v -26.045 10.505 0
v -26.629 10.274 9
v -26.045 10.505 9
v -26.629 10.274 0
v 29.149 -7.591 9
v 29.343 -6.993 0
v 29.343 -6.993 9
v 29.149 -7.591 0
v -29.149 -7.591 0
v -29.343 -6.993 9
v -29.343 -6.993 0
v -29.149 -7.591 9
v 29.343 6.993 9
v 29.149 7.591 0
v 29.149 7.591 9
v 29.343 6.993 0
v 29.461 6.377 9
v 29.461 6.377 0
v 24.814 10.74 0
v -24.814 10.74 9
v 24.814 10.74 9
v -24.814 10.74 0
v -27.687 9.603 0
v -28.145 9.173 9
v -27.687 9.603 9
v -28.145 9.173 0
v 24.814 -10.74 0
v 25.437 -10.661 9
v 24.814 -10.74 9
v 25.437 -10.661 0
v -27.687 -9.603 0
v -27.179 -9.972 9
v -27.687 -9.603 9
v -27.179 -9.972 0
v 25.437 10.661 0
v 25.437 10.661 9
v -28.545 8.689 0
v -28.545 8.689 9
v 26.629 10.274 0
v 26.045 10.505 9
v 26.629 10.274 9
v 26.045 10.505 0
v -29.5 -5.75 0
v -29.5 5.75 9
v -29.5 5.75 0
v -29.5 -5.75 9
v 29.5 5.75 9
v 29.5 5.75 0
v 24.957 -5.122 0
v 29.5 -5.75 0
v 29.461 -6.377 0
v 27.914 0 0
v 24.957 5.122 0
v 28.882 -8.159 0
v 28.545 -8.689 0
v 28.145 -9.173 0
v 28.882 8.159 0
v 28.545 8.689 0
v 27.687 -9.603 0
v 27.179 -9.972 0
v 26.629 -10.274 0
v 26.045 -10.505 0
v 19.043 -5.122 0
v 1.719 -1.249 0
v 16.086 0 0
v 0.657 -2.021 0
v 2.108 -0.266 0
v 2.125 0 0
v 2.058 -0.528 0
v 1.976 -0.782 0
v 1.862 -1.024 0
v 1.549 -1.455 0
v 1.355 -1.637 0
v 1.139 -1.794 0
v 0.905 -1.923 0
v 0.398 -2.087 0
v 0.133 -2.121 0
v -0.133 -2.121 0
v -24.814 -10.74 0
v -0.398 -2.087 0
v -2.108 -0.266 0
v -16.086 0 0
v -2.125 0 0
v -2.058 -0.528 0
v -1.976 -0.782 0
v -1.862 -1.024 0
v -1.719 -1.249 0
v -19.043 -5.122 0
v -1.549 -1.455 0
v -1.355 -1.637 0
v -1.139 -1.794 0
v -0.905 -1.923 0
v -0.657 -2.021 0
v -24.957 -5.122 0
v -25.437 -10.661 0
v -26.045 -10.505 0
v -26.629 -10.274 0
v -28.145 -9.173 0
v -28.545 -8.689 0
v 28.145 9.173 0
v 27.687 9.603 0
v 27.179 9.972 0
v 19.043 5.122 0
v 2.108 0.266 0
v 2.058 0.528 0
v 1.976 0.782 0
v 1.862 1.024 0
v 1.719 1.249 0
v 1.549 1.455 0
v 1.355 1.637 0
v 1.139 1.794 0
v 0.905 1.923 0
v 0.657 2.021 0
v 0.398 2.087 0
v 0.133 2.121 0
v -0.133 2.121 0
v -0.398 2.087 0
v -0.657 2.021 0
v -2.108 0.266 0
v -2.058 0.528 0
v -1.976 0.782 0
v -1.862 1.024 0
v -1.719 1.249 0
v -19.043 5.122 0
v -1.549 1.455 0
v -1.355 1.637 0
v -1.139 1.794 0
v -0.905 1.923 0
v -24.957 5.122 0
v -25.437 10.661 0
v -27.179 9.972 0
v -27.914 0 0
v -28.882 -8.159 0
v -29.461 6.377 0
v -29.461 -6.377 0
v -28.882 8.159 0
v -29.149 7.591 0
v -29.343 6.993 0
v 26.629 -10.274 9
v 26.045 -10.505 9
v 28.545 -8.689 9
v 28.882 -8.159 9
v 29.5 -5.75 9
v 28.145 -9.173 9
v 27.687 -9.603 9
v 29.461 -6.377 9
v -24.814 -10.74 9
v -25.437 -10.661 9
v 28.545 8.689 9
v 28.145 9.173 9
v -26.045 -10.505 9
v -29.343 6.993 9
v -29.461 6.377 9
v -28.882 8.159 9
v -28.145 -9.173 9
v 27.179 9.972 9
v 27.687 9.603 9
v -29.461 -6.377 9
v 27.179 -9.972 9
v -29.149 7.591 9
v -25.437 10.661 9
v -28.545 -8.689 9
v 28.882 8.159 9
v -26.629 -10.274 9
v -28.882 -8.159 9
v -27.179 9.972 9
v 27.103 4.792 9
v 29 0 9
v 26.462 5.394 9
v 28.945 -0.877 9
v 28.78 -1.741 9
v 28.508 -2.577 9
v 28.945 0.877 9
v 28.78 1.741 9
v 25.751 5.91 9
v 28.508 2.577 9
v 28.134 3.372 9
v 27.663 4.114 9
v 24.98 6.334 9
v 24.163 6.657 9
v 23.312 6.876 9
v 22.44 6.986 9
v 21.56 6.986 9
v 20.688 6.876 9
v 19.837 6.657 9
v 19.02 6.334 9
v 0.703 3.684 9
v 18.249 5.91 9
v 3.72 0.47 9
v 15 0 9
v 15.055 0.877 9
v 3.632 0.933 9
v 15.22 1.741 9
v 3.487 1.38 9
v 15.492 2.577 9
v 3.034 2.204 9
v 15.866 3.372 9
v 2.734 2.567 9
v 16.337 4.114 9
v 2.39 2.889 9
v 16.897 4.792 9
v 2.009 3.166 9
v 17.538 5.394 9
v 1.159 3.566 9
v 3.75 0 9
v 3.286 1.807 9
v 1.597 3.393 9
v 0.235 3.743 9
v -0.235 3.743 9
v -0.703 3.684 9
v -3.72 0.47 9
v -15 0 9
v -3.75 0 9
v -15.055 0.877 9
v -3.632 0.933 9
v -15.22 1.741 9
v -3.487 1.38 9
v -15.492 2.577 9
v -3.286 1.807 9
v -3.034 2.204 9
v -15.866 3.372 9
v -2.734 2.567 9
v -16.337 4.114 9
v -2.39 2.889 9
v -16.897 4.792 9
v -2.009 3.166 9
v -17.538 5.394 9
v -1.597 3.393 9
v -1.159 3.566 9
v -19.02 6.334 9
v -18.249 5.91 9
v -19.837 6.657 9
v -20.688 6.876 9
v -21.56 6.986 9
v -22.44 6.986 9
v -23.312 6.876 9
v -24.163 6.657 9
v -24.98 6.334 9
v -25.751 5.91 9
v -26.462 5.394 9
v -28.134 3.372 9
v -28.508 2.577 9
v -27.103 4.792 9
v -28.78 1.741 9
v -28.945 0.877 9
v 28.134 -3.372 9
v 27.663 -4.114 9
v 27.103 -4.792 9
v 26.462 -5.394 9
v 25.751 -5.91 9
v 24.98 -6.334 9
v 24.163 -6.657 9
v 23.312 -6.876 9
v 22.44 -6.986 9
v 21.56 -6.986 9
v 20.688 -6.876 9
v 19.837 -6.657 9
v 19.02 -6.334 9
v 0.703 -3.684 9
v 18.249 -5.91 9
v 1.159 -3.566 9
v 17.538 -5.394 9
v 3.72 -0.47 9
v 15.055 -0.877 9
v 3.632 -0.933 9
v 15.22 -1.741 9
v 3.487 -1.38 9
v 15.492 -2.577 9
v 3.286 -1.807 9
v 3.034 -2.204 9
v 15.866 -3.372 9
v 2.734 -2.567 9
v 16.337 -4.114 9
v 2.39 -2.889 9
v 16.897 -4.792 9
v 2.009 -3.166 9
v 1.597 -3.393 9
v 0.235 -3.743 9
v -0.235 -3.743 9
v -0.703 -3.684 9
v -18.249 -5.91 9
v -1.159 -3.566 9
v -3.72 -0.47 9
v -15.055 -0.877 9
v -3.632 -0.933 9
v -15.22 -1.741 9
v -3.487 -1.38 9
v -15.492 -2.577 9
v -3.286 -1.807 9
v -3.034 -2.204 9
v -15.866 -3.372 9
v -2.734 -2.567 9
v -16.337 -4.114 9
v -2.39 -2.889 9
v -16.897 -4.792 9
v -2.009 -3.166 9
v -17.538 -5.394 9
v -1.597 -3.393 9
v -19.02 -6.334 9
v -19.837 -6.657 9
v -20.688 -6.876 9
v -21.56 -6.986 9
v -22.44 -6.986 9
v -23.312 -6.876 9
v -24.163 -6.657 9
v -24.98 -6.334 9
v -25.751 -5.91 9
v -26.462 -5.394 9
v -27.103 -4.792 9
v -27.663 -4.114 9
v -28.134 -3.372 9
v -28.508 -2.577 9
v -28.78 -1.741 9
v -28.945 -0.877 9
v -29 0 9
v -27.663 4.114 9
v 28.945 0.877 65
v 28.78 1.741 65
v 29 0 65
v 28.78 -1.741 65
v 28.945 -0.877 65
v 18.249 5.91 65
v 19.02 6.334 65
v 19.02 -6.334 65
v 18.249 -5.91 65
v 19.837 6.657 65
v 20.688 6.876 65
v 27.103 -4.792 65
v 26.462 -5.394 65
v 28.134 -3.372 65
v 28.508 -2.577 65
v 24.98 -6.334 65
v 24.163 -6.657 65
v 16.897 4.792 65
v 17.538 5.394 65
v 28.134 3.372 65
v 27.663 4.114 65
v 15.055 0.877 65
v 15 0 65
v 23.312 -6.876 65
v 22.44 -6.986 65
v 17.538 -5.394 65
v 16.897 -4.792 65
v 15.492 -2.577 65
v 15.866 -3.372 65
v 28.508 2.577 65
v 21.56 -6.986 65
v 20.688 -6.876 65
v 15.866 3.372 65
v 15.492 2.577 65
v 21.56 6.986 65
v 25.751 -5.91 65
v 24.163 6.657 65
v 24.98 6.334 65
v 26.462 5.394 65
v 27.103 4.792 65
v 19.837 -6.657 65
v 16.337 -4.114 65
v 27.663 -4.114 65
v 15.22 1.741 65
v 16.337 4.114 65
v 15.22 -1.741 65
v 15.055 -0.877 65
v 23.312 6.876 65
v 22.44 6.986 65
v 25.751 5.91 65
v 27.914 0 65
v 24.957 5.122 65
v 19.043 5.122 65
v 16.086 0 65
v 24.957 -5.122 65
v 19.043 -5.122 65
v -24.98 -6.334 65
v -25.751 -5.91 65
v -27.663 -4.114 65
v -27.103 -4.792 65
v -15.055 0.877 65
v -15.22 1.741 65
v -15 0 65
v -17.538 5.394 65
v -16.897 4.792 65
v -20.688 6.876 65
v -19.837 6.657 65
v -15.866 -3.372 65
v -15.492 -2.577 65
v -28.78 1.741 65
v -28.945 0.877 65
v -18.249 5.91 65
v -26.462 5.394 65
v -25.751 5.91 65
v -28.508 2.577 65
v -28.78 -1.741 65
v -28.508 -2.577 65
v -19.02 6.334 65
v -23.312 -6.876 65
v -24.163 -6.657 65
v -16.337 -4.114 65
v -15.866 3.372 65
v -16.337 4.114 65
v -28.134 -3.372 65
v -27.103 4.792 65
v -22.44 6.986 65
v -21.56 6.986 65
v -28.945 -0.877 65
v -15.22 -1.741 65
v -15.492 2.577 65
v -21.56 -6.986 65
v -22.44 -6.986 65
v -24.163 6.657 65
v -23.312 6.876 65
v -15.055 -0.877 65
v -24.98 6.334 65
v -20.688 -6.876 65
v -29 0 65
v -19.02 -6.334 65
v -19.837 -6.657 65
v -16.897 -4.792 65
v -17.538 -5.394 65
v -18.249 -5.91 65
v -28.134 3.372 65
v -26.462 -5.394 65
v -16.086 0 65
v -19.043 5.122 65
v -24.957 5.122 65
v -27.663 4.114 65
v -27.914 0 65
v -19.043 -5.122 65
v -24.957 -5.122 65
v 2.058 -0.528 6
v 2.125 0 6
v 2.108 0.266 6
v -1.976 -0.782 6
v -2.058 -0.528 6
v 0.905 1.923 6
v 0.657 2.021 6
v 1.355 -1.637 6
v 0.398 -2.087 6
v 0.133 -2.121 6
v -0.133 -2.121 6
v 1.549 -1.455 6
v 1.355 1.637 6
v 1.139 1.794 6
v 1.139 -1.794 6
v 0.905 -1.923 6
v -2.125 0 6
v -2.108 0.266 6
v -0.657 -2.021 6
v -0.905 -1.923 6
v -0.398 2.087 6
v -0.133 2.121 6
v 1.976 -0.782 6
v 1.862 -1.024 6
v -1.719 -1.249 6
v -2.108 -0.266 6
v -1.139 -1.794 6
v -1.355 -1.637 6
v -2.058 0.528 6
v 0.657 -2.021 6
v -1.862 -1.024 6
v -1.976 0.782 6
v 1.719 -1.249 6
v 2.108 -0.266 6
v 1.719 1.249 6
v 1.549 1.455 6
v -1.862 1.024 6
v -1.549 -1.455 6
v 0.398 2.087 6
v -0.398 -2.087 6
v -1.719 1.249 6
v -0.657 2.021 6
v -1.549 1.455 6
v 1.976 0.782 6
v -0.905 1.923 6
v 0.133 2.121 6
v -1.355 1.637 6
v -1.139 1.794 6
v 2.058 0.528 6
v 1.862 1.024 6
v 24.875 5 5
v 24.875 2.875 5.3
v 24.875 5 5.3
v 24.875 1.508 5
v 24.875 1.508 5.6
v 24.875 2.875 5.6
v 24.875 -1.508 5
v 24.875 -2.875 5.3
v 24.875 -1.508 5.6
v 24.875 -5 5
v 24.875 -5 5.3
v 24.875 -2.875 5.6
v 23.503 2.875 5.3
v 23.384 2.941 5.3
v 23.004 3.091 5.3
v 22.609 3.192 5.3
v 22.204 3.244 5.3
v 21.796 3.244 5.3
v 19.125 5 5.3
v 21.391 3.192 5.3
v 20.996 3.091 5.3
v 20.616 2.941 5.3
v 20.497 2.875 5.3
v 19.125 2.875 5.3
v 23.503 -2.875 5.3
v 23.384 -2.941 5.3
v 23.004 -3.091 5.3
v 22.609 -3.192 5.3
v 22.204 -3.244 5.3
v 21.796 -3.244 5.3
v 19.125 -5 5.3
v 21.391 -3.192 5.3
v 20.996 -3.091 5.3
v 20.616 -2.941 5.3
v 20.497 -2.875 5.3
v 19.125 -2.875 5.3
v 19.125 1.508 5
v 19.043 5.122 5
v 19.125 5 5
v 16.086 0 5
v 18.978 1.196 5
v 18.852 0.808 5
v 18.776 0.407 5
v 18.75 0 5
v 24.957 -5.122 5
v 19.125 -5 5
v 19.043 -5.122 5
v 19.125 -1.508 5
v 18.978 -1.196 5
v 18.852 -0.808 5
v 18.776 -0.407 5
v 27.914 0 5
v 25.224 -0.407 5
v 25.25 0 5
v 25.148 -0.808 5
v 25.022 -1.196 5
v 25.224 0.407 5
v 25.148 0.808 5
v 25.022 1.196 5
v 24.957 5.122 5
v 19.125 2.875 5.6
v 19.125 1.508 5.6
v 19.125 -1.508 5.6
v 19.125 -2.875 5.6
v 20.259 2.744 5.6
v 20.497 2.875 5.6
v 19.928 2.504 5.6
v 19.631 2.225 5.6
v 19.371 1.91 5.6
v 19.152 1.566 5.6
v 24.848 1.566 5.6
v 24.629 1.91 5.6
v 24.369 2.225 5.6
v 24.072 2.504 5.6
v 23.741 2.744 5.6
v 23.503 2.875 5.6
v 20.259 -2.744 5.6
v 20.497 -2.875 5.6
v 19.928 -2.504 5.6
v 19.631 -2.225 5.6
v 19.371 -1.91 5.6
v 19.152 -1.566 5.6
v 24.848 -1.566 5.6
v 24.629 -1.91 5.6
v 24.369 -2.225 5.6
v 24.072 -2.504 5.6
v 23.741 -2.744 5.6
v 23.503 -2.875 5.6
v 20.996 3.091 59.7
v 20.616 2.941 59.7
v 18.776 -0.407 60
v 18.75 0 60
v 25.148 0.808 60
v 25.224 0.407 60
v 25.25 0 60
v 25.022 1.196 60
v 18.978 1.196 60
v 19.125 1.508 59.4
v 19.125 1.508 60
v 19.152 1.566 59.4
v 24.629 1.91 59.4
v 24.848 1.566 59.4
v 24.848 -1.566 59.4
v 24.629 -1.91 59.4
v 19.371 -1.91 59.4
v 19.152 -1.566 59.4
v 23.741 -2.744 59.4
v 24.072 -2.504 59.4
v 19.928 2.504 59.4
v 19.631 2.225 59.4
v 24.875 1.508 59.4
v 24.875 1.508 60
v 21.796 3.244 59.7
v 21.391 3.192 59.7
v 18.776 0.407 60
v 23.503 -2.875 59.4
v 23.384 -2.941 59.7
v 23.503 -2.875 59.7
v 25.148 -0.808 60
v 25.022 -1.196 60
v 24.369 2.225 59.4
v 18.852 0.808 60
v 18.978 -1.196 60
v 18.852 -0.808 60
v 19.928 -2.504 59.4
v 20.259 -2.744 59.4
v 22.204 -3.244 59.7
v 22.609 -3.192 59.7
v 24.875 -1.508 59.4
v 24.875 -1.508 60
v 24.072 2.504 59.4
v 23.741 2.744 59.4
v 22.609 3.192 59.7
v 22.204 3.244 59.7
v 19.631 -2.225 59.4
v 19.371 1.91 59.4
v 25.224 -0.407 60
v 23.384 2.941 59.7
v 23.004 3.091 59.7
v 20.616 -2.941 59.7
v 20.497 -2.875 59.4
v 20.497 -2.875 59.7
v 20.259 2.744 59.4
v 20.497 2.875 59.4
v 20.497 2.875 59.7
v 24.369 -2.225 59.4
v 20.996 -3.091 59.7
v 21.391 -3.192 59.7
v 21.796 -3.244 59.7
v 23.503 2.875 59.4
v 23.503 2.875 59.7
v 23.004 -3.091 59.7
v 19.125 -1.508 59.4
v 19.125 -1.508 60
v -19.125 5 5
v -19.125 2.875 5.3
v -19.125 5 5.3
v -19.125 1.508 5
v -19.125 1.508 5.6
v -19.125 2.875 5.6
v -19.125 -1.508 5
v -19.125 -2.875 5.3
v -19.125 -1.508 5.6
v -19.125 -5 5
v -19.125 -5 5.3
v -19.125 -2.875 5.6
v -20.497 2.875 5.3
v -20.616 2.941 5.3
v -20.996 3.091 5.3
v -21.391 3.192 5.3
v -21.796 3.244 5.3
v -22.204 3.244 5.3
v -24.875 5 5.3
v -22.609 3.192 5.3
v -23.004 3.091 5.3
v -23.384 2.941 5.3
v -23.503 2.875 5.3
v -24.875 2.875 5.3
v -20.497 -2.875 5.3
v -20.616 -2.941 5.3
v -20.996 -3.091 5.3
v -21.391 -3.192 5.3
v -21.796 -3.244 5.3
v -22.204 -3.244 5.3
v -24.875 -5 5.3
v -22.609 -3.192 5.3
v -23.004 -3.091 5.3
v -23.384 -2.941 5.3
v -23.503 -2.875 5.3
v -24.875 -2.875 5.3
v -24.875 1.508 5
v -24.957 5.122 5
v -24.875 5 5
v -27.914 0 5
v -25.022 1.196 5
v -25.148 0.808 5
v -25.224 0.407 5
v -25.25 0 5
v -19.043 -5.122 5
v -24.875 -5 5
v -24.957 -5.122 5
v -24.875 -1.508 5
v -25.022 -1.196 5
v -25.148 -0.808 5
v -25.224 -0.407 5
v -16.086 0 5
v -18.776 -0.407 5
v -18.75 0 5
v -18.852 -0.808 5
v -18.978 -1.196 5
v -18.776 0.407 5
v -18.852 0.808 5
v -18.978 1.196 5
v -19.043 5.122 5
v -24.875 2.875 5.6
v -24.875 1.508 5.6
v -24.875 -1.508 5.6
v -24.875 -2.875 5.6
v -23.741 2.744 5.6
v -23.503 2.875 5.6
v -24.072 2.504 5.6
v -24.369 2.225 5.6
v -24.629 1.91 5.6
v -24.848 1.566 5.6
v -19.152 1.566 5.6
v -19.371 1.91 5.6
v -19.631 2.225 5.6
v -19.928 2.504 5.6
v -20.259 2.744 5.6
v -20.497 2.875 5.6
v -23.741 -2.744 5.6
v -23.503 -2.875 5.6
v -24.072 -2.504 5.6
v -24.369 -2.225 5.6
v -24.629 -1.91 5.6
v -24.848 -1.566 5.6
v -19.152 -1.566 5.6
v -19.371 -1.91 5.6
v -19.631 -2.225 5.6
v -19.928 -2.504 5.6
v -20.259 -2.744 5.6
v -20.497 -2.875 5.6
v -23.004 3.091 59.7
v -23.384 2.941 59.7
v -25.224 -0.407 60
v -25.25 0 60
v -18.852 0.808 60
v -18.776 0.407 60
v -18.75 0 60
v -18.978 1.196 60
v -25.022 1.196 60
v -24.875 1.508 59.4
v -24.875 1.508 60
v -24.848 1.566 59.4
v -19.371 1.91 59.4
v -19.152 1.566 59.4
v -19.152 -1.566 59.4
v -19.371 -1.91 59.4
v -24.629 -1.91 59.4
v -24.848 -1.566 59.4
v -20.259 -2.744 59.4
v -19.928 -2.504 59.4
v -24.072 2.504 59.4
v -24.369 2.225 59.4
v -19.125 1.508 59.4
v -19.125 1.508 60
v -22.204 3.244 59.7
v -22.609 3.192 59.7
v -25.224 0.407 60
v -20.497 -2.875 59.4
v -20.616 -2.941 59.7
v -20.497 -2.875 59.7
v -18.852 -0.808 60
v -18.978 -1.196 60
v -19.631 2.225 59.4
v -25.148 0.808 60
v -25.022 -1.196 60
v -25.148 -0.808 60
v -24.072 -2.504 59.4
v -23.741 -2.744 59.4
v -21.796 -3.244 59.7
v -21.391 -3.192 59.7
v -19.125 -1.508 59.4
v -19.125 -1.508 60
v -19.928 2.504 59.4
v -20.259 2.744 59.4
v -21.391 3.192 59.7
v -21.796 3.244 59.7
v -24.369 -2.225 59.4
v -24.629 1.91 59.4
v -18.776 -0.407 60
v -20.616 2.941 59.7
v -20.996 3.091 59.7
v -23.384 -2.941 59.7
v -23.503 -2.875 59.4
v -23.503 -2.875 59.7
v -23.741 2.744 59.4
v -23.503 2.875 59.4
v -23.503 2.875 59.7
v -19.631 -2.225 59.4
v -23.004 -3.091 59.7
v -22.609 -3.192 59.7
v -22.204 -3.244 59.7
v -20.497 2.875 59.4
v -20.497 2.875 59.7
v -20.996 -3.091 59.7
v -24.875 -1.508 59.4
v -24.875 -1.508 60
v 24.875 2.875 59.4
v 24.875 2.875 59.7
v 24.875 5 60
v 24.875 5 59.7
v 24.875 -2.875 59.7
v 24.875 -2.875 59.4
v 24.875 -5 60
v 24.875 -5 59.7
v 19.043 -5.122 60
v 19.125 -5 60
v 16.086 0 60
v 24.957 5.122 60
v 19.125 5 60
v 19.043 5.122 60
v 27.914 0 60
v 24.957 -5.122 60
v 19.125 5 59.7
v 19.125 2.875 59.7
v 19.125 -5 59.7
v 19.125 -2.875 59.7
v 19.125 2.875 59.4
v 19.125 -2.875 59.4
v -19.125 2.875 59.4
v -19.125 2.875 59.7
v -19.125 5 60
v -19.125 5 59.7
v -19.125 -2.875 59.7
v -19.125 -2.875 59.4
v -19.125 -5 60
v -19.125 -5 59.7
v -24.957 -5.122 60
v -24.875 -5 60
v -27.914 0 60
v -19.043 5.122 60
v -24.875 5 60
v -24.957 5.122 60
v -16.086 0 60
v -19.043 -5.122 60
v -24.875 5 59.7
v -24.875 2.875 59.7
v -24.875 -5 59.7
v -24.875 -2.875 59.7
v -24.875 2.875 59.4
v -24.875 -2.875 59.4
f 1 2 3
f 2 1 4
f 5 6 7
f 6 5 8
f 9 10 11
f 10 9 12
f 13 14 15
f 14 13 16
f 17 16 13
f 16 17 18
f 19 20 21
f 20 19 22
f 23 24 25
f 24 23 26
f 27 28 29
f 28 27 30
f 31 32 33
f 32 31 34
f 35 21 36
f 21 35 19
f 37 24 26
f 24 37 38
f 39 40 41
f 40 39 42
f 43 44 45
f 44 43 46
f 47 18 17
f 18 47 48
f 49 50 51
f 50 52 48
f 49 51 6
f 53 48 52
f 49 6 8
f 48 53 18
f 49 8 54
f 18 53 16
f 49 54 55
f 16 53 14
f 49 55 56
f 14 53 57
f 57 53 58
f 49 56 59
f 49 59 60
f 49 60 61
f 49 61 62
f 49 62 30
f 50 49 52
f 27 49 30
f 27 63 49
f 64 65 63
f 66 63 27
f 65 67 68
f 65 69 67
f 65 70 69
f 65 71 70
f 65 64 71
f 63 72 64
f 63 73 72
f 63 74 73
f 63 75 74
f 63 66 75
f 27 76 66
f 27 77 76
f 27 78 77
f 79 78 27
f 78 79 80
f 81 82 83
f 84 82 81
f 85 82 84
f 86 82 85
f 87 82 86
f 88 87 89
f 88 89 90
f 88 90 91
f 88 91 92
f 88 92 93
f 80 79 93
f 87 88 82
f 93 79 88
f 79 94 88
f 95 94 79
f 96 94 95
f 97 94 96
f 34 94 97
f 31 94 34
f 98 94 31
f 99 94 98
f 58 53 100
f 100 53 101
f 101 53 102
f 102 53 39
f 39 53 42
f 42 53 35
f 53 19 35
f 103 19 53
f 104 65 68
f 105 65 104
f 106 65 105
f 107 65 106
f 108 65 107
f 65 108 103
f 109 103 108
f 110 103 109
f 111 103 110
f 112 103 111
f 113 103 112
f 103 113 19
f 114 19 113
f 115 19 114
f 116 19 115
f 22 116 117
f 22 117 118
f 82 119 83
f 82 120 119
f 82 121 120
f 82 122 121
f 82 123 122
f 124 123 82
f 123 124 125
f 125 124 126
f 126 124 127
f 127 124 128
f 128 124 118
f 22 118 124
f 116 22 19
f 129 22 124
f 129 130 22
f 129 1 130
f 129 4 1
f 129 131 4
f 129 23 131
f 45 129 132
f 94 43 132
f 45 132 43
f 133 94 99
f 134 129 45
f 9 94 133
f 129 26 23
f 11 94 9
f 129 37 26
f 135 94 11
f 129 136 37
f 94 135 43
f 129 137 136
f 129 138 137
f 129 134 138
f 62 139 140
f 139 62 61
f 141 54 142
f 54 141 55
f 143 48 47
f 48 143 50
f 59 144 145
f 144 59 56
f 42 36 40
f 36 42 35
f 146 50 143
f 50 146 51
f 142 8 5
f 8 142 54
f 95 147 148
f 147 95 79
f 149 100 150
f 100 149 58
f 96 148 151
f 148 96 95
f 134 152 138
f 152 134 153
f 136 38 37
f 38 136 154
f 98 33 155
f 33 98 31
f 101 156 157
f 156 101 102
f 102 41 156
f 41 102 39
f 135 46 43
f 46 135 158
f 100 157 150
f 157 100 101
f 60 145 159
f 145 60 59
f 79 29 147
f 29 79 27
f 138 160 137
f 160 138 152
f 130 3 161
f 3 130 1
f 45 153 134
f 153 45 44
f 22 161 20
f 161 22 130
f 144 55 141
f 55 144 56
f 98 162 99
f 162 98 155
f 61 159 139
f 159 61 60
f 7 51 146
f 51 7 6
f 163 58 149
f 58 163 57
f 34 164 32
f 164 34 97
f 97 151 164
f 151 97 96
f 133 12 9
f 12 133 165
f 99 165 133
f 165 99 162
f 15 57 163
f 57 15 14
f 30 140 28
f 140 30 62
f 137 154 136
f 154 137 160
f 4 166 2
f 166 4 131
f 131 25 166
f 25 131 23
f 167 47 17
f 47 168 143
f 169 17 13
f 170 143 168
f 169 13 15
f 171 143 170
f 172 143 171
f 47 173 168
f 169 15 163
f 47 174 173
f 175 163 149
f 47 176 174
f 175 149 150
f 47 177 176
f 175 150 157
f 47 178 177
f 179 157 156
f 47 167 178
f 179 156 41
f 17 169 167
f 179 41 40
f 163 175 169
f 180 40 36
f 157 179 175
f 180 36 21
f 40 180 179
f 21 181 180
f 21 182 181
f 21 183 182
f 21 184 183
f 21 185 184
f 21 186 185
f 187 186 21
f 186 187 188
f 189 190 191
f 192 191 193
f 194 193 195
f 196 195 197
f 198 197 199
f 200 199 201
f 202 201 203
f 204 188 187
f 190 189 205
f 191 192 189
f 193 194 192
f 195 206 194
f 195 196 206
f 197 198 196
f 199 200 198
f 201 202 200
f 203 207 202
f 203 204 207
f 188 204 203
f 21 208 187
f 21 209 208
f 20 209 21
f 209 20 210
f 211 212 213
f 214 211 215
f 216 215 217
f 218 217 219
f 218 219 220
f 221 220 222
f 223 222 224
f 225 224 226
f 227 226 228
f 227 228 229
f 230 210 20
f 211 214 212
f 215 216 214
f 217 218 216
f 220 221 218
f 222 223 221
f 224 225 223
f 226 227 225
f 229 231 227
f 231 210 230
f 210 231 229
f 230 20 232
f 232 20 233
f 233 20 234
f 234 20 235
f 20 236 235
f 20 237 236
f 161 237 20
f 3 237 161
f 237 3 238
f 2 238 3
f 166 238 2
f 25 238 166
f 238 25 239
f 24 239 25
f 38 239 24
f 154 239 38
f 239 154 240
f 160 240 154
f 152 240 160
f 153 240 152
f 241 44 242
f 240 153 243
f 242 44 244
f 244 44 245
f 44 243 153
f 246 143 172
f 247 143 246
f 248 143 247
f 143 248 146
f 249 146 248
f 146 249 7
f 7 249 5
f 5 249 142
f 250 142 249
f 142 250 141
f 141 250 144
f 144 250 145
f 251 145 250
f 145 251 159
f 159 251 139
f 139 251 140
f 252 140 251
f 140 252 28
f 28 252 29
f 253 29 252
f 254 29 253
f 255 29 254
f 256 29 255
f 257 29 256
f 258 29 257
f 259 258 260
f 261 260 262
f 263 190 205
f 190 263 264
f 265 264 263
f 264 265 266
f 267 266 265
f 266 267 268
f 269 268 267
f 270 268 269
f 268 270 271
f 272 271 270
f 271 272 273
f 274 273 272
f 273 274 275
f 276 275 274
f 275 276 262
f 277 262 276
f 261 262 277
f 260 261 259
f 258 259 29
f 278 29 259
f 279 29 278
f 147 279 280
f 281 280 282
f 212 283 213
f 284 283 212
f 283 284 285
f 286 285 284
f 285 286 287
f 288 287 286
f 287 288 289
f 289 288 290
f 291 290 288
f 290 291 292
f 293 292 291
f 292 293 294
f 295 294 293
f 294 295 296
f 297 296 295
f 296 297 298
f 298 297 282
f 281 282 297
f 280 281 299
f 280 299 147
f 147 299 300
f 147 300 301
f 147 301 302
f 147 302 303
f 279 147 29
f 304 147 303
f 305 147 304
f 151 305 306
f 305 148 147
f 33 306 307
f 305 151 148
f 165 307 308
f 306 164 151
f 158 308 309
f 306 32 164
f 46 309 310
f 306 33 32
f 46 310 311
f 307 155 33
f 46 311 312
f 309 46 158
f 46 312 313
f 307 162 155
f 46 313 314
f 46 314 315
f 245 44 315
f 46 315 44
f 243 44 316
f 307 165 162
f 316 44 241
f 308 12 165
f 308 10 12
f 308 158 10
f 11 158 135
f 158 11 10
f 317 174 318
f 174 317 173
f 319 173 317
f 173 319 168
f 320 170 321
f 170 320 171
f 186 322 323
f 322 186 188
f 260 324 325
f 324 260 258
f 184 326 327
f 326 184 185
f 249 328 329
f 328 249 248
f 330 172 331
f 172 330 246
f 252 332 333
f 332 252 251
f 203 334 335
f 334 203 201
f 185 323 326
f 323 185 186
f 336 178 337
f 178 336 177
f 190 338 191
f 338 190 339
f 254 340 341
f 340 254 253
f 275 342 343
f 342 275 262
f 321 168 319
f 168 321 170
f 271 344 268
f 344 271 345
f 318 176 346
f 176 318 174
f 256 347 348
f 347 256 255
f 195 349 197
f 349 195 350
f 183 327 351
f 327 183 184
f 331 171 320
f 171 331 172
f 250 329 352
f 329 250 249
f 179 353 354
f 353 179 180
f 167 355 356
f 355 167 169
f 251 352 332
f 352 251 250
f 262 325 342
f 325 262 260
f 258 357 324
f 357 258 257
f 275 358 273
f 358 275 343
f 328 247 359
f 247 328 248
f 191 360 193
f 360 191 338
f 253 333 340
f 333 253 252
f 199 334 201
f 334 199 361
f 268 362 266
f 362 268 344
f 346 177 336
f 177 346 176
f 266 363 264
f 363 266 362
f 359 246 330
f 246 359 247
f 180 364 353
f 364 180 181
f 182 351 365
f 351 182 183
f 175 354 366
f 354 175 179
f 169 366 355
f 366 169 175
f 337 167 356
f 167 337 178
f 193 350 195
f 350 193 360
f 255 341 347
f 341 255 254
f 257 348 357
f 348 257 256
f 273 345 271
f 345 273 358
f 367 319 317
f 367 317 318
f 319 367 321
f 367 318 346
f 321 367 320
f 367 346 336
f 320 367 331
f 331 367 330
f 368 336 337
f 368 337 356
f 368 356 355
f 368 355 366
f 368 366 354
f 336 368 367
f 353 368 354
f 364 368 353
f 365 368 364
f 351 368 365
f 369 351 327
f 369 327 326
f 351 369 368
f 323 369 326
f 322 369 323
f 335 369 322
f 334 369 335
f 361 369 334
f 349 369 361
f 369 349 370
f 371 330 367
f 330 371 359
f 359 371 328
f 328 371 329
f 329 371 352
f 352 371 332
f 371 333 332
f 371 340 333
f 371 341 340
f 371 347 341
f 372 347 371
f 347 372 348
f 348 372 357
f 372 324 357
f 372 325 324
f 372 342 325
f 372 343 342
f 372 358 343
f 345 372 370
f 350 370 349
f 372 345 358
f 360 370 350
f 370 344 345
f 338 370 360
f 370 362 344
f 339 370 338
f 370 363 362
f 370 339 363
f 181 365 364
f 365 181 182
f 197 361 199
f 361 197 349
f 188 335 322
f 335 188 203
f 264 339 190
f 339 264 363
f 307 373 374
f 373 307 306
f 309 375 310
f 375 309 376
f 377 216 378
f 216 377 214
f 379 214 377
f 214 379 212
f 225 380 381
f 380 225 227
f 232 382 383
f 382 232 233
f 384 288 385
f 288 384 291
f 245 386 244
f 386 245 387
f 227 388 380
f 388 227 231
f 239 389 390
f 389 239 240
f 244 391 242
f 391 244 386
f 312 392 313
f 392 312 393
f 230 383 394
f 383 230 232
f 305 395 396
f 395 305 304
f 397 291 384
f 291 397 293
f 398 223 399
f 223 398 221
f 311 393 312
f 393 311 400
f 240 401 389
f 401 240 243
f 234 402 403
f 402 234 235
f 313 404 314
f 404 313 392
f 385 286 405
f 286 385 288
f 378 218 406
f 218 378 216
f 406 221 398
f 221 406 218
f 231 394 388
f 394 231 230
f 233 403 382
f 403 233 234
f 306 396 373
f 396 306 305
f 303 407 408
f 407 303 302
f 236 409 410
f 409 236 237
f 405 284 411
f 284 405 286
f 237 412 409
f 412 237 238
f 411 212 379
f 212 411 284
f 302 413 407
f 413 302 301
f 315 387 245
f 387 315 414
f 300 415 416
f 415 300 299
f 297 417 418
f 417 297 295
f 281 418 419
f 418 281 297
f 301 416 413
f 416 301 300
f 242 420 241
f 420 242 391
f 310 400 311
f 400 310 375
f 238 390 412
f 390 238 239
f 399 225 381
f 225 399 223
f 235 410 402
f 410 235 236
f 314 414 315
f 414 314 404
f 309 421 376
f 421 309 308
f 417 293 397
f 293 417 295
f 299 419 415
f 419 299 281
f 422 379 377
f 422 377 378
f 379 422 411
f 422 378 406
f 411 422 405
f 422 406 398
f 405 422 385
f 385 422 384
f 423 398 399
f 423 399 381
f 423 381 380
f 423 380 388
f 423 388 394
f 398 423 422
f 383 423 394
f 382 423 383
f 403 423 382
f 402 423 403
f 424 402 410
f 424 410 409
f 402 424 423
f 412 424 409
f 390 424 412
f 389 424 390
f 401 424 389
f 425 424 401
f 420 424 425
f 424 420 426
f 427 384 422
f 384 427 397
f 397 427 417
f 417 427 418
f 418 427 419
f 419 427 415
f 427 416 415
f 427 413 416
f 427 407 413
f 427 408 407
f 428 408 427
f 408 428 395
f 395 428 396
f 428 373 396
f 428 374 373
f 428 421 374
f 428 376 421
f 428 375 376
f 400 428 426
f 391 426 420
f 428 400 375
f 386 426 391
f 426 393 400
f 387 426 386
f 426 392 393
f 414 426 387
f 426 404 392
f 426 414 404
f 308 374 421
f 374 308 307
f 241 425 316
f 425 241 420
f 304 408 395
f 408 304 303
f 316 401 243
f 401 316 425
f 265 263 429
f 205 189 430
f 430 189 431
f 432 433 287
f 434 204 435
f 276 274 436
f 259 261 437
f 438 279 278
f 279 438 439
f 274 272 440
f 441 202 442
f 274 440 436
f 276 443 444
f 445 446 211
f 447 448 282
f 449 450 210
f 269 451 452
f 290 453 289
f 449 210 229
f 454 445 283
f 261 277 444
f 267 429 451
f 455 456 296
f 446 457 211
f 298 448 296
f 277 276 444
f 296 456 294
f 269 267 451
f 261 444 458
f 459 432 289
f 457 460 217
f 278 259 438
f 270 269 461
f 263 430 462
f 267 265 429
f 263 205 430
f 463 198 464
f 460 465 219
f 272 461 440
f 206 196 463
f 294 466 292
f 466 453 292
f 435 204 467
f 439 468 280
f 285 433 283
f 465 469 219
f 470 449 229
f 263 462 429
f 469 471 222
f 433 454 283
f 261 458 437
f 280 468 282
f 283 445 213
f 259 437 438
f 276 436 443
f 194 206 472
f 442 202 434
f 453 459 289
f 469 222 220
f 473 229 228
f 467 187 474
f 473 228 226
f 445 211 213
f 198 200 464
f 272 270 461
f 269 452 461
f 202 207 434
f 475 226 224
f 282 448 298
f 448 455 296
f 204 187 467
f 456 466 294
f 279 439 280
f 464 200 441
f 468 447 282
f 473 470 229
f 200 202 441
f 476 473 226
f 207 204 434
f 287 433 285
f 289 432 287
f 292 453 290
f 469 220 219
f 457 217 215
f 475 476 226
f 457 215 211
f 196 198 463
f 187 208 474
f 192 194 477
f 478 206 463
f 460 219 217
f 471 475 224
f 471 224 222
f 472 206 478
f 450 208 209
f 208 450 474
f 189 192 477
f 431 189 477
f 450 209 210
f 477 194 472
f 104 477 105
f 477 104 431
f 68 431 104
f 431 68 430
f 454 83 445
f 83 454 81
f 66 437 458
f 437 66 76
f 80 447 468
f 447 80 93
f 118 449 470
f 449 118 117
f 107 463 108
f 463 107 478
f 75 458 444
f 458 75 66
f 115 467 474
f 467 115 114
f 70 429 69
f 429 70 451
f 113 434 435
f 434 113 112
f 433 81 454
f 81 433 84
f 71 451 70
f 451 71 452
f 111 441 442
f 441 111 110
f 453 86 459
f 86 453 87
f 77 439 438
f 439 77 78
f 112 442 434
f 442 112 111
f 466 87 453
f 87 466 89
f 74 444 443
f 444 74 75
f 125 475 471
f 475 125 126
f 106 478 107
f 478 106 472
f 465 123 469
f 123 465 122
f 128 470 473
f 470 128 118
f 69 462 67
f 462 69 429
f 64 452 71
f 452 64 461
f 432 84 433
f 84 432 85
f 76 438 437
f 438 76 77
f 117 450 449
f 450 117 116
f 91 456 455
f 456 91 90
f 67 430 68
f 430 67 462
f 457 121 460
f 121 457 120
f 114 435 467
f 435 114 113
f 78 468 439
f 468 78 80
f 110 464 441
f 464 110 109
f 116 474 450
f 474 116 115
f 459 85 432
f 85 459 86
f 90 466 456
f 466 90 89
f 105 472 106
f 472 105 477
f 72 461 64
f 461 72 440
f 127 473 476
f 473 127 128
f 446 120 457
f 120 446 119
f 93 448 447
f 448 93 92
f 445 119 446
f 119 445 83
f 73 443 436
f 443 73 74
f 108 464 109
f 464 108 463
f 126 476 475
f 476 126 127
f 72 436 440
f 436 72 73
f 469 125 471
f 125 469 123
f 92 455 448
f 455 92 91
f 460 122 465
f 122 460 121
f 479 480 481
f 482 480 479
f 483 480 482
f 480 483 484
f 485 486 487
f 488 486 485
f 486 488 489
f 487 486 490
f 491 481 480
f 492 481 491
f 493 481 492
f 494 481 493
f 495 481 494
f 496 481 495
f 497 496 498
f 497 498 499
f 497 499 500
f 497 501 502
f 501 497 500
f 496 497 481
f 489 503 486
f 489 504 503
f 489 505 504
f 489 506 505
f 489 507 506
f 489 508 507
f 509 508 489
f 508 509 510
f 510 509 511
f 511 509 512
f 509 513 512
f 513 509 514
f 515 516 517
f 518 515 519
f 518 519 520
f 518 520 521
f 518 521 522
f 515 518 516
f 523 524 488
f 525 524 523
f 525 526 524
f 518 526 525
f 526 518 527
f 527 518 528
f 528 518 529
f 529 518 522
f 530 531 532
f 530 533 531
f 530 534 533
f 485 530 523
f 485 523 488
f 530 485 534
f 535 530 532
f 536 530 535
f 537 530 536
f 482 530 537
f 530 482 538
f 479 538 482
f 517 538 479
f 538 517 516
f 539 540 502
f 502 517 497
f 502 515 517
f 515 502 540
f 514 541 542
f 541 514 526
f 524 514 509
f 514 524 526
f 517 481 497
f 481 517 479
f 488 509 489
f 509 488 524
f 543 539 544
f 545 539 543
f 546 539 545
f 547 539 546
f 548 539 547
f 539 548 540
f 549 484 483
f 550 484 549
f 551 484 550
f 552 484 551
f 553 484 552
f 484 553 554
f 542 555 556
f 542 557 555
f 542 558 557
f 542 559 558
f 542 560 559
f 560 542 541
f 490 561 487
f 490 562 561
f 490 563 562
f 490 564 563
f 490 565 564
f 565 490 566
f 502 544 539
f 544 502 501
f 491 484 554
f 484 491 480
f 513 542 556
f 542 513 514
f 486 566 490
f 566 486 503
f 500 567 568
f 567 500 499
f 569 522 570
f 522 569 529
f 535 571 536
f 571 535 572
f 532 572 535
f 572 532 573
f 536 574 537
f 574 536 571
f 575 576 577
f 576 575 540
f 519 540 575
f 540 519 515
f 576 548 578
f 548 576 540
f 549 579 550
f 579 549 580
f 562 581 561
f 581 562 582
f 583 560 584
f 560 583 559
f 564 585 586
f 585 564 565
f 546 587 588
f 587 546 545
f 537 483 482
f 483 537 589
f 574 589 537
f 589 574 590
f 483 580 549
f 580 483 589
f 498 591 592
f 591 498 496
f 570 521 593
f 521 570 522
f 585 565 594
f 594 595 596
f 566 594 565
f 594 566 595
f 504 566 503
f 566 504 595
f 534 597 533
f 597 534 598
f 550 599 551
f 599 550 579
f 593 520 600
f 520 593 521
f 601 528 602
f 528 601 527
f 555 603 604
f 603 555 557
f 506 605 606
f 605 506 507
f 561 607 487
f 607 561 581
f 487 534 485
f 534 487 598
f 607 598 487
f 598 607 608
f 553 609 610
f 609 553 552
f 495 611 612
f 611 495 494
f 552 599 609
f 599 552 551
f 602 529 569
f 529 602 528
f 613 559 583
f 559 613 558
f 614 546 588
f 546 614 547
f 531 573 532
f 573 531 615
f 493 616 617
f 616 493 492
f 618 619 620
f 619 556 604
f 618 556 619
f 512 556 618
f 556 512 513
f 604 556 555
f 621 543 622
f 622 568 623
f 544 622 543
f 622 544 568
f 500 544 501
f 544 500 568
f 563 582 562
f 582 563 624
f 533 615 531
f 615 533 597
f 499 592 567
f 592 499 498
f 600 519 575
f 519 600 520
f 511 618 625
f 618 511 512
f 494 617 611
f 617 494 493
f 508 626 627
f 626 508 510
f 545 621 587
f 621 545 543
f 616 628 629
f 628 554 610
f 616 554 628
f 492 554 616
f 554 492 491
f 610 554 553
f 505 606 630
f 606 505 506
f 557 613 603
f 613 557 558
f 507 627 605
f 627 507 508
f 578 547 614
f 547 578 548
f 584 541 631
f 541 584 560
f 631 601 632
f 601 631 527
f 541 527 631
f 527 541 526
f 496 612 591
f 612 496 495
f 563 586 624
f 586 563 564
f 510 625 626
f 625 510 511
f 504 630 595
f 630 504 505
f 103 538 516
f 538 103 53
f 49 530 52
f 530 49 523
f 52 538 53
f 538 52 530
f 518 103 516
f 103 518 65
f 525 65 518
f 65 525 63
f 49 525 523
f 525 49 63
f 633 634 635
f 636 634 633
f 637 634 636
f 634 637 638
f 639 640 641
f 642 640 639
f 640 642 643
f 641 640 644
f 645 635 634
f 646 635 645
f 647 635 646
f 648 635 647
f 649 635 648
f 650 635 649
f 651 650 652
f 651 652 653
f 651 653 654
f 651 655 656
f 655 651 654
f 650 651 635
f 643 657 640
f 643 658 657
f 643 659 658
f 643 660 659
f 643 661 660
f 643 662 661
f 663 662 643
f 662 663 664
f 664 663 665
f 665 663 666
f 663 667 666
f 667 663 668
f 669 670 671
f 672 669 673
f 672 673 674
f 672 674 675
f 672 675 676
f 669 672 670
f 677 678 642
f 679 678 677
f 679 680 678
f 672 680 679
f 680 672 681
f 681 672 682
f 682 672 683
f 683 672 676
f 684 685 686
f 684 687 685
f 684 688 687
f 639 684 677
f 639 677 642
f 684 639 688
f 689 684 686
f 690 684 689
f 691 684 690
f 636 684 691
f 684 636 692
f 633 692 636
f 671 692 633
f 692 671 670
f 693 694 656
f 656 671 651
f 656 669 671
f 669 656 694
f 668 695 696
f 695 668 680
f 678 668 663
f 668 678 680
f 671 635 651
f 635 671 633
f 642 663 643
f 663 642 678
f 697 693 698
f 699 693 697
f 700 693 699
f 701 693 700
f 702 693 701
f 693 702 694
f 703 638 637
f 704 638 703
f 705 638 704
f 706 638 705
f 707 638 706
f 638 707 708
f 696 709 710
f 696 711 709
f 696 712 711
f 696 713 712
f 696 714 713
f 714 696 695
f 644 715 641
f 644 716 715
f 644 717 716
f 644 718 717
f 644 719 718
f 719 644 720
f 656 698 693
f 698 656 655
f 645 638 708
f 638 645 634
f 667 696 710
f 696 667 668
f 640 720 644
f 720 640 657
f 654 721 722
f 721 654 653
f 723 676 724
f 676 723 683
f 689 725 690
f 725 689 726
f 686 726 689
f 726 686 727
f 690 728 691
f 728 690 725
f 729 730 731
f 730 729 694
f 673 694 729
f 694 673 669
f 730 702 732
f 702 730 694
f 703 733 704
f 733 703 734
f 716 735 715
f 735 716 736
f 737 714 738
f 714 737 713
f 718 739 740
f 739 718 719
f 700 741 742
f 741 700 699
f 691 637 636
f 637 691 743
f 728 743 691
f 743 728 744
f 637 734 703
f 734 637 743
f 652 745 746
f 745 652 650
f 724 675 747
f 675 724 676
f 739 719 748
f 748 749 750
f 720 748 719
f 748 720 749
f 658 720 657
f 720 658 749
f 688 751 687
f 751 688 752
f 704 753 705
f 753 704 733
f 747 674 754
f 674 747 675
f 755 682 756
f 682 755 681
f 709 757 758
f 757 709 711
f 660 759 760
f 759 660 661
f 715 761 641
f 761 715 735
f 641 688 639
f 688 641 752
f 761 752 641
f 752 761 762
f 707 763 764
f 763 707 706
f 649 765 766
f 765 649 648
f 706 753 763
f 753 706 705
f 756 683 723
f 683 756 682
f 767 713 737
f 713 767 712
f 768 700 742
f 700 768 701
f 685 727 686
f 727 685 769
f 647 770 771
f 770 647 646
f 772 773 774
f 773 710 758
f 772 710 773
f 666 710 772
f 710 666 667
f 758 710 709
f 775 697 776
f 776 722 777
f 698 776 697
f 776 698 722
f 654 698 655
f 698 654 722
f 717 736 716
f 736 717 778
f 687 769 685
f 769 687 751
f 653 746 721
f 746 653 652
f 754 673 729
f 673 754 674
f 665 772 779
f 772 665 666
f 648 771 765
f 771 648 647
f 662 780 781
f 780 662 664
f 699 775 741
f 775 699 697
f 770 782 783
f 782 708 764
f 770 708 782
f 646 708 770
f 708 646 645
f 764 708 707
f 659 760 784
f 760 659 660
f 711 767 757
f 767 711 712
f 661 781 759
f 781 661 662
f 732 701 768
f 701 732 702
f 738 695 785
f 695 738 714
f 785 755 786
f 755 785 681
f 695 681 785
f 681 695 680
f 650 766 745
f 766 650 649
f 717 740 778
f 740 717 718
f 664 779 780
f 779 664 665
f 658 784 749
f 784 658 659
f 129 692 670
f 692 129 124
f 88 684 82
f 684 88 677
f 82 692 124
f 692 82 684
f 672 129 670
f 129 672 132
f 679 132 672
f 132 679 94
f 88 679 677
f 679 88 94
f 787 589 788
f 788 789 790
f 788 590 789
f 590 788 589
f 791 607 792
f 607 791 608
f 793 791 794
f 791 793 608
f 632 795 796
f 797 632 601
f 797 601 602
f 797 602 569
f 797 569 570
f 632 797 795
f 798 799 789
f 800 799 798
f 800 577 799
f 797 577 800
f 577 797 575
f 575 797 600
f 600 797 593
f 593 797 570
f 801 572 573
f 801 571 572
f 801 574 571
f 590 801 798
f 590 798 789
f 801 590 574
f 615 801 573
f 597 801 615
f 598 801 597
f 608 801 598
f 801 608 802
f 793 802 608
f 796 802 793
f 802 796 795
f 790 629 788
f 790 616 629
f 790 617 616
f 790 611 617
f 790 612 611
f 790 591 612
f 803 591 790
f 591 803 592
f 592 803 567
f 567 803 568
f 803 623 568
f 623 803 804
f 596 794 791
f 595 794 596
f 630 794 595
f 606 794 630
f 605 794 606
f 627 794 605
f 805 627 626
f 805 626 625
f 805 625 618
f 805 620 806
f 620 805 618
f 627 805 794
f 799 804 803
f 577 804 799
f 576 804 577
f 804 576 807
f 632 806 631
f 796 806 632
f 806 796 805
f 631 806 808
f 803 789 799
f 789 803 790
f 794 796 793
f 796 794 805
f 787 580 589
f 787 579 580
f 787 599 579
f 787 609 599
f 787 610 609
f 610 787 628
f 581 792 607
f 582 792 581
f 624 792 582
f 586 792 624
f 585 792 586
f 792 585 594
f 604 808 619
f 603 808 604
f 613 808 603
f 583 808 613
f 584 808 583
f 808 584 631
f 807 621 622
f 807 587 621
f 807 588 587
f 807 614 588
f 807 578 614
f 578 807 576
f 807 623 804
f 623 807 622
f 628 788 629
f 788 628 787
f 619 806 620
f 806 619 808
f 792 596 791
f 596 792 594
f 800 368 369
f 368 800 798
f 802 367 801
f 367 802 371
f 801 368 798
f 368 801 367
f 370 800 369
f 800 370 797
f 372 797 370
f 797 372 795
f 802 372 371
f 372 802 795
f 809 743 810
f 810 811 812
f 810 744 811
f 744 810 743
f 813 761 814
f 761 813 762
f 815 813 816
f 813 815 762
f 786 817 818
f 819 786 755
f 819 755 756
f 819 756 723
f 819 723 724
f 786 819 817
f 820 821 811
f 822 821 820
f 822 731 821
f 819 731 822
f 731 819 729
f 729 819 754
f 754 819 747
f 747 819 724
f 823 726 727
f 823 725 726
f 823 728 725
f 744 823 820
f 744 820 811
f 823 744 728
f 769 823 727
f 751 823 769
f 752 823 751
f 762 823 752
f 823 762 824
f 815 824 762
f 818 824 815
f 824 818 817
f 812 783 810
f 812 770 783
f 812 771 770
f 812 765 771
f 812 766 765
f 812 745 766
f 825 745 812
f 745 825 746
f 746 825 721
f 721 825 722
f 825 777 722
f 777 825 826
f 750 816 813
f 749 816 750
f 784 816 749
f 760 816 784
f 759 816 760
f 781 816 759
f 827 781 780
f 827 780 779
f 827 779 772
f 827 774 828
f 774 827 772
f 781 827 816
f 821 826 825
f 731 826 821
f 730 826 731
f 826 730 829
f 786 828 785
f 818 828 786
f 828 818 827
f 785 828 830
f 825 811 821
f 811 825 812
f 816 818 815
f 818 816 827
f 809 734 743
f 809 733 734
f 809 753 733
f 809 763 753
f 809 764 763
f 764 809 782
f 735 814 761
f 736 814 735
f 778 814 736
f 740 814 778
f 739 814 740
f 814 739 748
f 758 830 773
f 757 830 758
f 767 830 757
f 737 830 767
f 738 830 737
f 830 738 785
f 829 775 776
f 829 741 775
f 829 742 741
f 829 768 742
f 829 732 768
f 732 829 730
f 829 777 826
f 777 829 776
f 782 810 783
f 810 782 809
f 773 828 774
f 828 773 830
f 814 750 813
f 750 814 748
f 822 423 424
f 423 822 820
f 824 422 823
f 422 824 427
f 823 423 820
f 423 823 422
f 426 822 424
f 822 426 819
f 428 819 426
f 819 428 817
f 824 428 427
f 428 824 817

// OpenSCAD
$fn = 50;


difference() {
	union() {
		hull() {
			translate(v = [-24.5000000000, 5.7500000000, 0]) {
				cylinder(h = 9, r = 5);
			}
			translate(v = [24.5000000000, 5.7500000000, 0]) {
				cylinder(h = 9, r = 5);
			}
			translate(v = [-24.5000000000, -5.7500000000, 0]) {
				cylinder(h = 9, r = 5);
			}
			translate(v = [24.5000000000, -5.7500000000, 0]) {
				cylinder(h = 9, r = 5);
			}
		}
		translate(v = [22.0000000000, 0, 0.0000000000]) {
			cylinder(h = 65, r = 7.0000000000);
		}
		translate(v = [-22.0000000000, 0, 0.0000000000]) {
			cylinder(h = 65, r = 7.0000000000);
		}
		translate(v = [22.0000000000, 0, 59.0000000000]) {
			cylinder(h = 6, r = 7.0000000000);
		}
		translate(v = [-22.0000000000, 0, 59.0000000000]) {
			cylinder(h = 6, r = 7.0000000000);
		}
	}
	union() {
		translate(v = [0, 0, 9]) {
			rotate(a = [0, 0, 0]) {
				difference() {
					union() {
						#translate(v = [0, 0, -60.0000000000]) {
							cylinder(h = 60, r = 2.0000000000);
						}
						#translate(v = [0, 0, -3]) {
							cylinder(h = 3, r1 = 2.1250000000, r2 = 3.7500000000);
						}
						#translate(v = [0, 0, -60.0000000000]) {
							cylinder(h = 60, r = 2.1250000000);
						}
						#translate(v = [0, 0, -60.0000000000]) {
							cylinder(h = 60, r = 2.0000000000);
						}
					}
					union();
				}
			}
		}
		translate(v = [22.0000000000, 0, 0]) {
			rotate(a = [0, 0, 0]) {
				difference() {
					union() {
						#translate(v = [-2.8750000000, -5.0000000000, -0.3000000000]) {
							cube(size = [5.7500000000, 10, 0.3000000000]);
						}
						#translate(v = [-2.8750000000, -2.8750000000, -0.6000000000]) {
							cube(size = [5.7500000000, 5.7500000000, 0.3000000000]);
						}
						#translate(v = [-2.8750000000, -5.0000000000, 5]) {
							cube(size = [5.7500000000, 10, 0.3000000000]);
						}
						#translate(v = [-2.8750000000, -2.8750000000, 5.3000000000]) {
							cube(size = [5.7500000000, 5.7500000000, 0.3000000000]);
						}
						#translate(v = [0, 0, -100.0000000000]) {
							cylinder(h = 200, r = 3.2500000000);
						}
						#linear_extrude(height = 5) {
							polygon(points = [[5.9142500000, 0.0000000000], [2.9571250000, 5.1218907443], [-2.9571250000, 5.1218907443], [-5.9142500000, 0.0000000000], [-2.9571250000, -5.1218907443], [2.9571250000, -5.1218907443]]);
						}
						#translate(v = [-2.8750000000, -5.0000000000, -0.3000000000]) {
							cube(size = [5.7500000000, 10, 0.3000000000]);
						}
						#translate(v = [-2.8750000000, -2.8750000000, -0.6000000000]) {
							cube(size = [5.7500000000, 5.7500000000, 0.3000000000]);
						}
						#translate(v = [-2.8750000000, -5.0000000000, 5]) {
							cube(size = [5.7500000000, 10, 0.3000000000]);
						}
						#translate(v = [-2.8750000000, -2.8750000000, 5.3000000000]) {
							cube(size = [5.7500000000, 5.7500000000, 0.3000000000]);
						}
						#translate(v = [0, 0, -100.0000000000]) {
							cylinder(h = 200, r = 3.2500000000);
						}
						#translate(v = [-2.8750000000, -5.0000000000, -0.3000000000]) {
							cube(size = [5.7500000000, 10, 0.3000000000]);
						}
						#translate(v = [-2.8750000000, -2.8750000000, -0.6000000000]) {
							cube(size = [5.7500000000, 5.7500000000, 0.3000000000]);
						}
						#translate(v = [-2.8750000000, -5.0000000000, 5]) {
							cube(size = [5.7500000000, 10, 0.3000000000]);
						}
						#translate(v = [-2.8750000000, -2.8750000000, 5.3000000000]) {
							cube(size = [5.7500000000, 5.7500000000, 0.3000000000]);
						}
						#translate(v = [0, 0, -100.0000000000]) {
							cylinder(h = 200, r = 3.2500000000);
						}
					}
					union();
				}
			}
		}
		translate(v = [-22.0000000000, 0, 0]) {
			rotate(a = [0, 0, 0]) {
				difference() {
					union() {
						#translate(v = [-2.8750000000, -5.0000000000, -0.3000000000]) {
							cube(size = [5.7500000000, 10, 0.3000000000]);
						}
						#translate(v = [-2.8750000000, -2.8750000000, -0.6000000000]) {
							cube(size = [5.7500000000, 5.7500000000, 0.3000000000]);
						}
						#translate(v = [-2.8750000000, -5.0000000000, 5]) {
							cube(size = [5.7500000000, 10, 0.3000000000]);
						}
						#translate(v = [-2.8750000000, -2.8750000000, 5.3000000000]) {
							cube(size = [5.7500000000, 5.7500000000, 0.3000000000]);
						}
						#translate(v = [0, 0, -100.0000000000]) {
							cylinder(h = 200, r = 3.2500000000);
						}
						#linear_extrude(height = 5) {
							polygon(points = [[5.9142500000, 0.0000000000], [2.9571250000, 5.1218907443], [-2.9571250000, 5.1218907443], [-5.9142500000, 0.0000000000], [-2.9571250000, -5.1218907443], [2.9571250000, -5.1218907443]]);
						}
						#translate(v = [-2.8750000000, -5.0000000000, -0.3000000000]) {
							cube(size = [5.7500000000, 10, 0.3000000000]);
						}
						#translate(v = [-2.8750000000, -2.8750000000, -0.6000000000]) {
							cube(size = [5.7500000000, 5.7500000000, 0.3000000000]);
						}
						#translate(v = [-2.8750000000, -5.0000000000, 5]) {
							cube(size = [5.7500000000, 10, 0.3000000000]);
						}
						#translate(v = [-2.8750000000, -2.8750000000, 5.3000000000]) {
							cube(size = [5.7500000000, 5.7500000000, 0.3000000000]);
						}
						#translate(v = [0, 0, -100.0000000000]) {
							cylinder(h = 200, r = 3.2500000000);
						}
						#translate(v = [-2.8750000000, -5.0000000000, -0.3000000000]) {
							cube(size = [5.7500000000, 10, 0.3000000000]);
						}
						#translate(v = [-2.8750000000, -2.8750000000, -0.6000000000]) {
							cube(size = [5.7500000000, 5.7500000000, 0.3000000000]);
						}
						#translate(v = [-2.8750000000, -5.0000000000, 5]) {
							cube(size = [5.7500000000, 10, 0.3000000000]);
						}
						#translate(v = [-2.8750000000, -2.8750000000, 5.3000000000]) {
							cube(size = [5.7500000000, 5.7500000000, 0.3000000000]);
						}
						#translate(v = [0, 0, -100.0000000000]) {
							cylinder(h = 200, r = 3.2500000000);
						}
					}
					union();
				}
			}
		}
		translate(v = [22.0000000000, 0, 65]) {
			rotate(a = [0, 0, 0]) {
				difference() {
					union() {
						#translate(v = [-2.8750000000, -5.0000000000, -5.3000000000]) {
							cube(size = [5.7500000000, 10, 0.3000000000]);
						}
						#translate(v = [-2.8750000000, -2.8750000000, -5.6000000000]) {
							cube(size = [5.7500000000, 5.7500000000, 0.3000000000]);
						}
						#translate(v = [-2.8750000000, -5.0000000000, 0]) {
							cube(size = [5.7500000000, 10, 0.3000000000]);
						}
						#translate(v = [-2.8750000000, -2.8750000000, 0.3000000000]) {
							cube(size = [5.7500000000, 5.7500000000, 0.3000000000]);
						}
						#translate(v = [0, 0, -100.0000000000]) {
							cylinder(h = 200, r = 3.2500000000);
						}
						translate(v = [0, 0, -5]) {
							#linear_extrude(height = 5) {
								polygon(points = [[5.9142500000, 0.0000000000], [2.9571250000, 5.1218907443], [-2.9571250000, 5.1218907443], [-5.9142500000, 0.0000000000], [-2.9571250000, -5.1218907443], [2.9571250000, -5.1218907443]]);
							}
						}
						#translate(v = [-2.8750000000, -5.0000000000, -5.3000000000]) {
							cube(size = [5.7500000000, 10, 0.3000000000]);
						}
						#translate(v = [-2.8750000000, -2.8750000000, -5.6000000000]) {
							cube(size = [5.7500000000, 5.7500000000, 0.3000000000]);
						}
						#translate(v = [-2.8750000000, -5.0000000000, 0]) {
							cube(size = [5.7500000000, 10, 0.3000000000]);
						}
						#translate(v = [-2.8750000000, -2.8750000000, 0.3000000000]) {
							cube(size = [5.7500000000, 5.7500000000, 0.3000000000]);
						}
						#translate(v = [0, 0, -100.0000000000]) {
							cylinder(h = 200, r = 3.2500000000);
						}
						#translate(v = [-2.8750000000, -5.0000000000, -5.3000000000]) {
							cube(size = [5.7500000000, 10, 0.3000000000]);
						}
						#translate(v = [-2.8750000000, -2.8750000000, -5.6000000000]) {
							cube(size = [5.7500000000, 5.7500000000, 0.3000000000]);
						}
						#translate(v = [-2.8750000000, -5.0000000000, 0]) {
							cube(size = [5.7500000000, 10, 0.3000000000]);
						}
						#translate(v = [-2.8750000000, -2.8750000000, 0.3000000000]) {
							cube(size = [5.7500000000, 5.7500000000, 0.3000000000]);
						}
						#translate(v = [0, 0, -100.0000000000]) {
							cylinder(h = 200, r = 3.2500000000);
						}
					}
					union();
				}
			}
		}
		translate(v = [-22.0000000000, 0, 65]) {
			rotate(a = [0, 0, 0]) {
				difference() {
					union() {
						#translate(v = [-2.8750000000, -5.0000000000, -5.3000000000]) {
							cube(size = [5.7500000000, 10, 0.3000000000]);
						}
						#translate(v = [-2.8750000000, -2.8750000000, -5.6000000000]) {
							cube(size = [5.7500000000, 5.7500000000, 0.3000000000]);
						}
						#translate(v = [-2.8750000000, -5.0000000000, 0]) {
							cube(size = [5.7500000000, 10, 0.3000000000]);
						}
						#translate(v = [-2.8750000000, -2.8750000000, 0.3000000000]) {
							cube(size = [5.7500000000, 5.7500000000, 0.3000000000]);
						}
						#translate(v = [0, 0, -100.0000000000]) {
							cylinder(h = 200, r = 3.2500000000);
						}
						translate(v = [0, 0, -5]) {
							#linear_extrude(height = 5) {
								polygon(points = [[5.9142500000, 0.0000000000], [2.9571250000, 5.1218907443], [-2.9571250000, 5.1218907443], [-5.9142500000, 0.0000000000], [-2.9571250000, -5.1218907443], [2.9571250000, -5.1218907443]]);
							}
						}
						#translate(v = [-2.8750000000, -5.0000000000, -5.3000000000]) {
							cube(size = [5.7500000000, 10, 0.3000000000]);
						}
						#translate(v = [-2.8750000000, -2.8750000000, -5.6000000000]) {
							cube(size = [5.7500000000, 5.7500000000, 0.3000000000]);
						}
						#translate(v = [-2.8750000000, -5.0000000000, 0]) {
							cube(size = [5.7500000000, 10, 0.3000000000]);
						}
						#translate(v = [-2.8750000000, -2.8750000000, 0.3000000000]) {
							cube(size = [5.7500000000, 5.7500000000, 0.3000000000]);
						}
						#translate(v = [0, 0, -100.0000000000]) {
							cylinder(h = 200, r = 3.2500000000);
						}
						#translate(v = [-2.8750000000, -5.0000000000, -5.3000000000]) {
							cube(size = [5.7500000000, 10, 0.3000000000]);
						}
						#translate(v = [-2.8750000000, -2.8750000000, -5.6000000000]) {
							cube(size = [5.7500000000, 5.7500000000, 0.3000000000]);
						}
						#translate(v = [-2.8750000000, -5.0000000000, 0]) {
							cube(size = [5.7500000000, 10, 0.3000000000]);
						}
						#translate(v = [-2.8750000000, -2.8750000000, 0.3000000000]) {
							cube(size = [5.7500000000, 5.7500000000, 0.3000000000]);
						}
						#translate(v = [0, 0, -100.0000000000]) {
							cylinder(h = 200, r = 3.2500000000);
						}
					}
					union();
				}
			}
		}
	}
}
